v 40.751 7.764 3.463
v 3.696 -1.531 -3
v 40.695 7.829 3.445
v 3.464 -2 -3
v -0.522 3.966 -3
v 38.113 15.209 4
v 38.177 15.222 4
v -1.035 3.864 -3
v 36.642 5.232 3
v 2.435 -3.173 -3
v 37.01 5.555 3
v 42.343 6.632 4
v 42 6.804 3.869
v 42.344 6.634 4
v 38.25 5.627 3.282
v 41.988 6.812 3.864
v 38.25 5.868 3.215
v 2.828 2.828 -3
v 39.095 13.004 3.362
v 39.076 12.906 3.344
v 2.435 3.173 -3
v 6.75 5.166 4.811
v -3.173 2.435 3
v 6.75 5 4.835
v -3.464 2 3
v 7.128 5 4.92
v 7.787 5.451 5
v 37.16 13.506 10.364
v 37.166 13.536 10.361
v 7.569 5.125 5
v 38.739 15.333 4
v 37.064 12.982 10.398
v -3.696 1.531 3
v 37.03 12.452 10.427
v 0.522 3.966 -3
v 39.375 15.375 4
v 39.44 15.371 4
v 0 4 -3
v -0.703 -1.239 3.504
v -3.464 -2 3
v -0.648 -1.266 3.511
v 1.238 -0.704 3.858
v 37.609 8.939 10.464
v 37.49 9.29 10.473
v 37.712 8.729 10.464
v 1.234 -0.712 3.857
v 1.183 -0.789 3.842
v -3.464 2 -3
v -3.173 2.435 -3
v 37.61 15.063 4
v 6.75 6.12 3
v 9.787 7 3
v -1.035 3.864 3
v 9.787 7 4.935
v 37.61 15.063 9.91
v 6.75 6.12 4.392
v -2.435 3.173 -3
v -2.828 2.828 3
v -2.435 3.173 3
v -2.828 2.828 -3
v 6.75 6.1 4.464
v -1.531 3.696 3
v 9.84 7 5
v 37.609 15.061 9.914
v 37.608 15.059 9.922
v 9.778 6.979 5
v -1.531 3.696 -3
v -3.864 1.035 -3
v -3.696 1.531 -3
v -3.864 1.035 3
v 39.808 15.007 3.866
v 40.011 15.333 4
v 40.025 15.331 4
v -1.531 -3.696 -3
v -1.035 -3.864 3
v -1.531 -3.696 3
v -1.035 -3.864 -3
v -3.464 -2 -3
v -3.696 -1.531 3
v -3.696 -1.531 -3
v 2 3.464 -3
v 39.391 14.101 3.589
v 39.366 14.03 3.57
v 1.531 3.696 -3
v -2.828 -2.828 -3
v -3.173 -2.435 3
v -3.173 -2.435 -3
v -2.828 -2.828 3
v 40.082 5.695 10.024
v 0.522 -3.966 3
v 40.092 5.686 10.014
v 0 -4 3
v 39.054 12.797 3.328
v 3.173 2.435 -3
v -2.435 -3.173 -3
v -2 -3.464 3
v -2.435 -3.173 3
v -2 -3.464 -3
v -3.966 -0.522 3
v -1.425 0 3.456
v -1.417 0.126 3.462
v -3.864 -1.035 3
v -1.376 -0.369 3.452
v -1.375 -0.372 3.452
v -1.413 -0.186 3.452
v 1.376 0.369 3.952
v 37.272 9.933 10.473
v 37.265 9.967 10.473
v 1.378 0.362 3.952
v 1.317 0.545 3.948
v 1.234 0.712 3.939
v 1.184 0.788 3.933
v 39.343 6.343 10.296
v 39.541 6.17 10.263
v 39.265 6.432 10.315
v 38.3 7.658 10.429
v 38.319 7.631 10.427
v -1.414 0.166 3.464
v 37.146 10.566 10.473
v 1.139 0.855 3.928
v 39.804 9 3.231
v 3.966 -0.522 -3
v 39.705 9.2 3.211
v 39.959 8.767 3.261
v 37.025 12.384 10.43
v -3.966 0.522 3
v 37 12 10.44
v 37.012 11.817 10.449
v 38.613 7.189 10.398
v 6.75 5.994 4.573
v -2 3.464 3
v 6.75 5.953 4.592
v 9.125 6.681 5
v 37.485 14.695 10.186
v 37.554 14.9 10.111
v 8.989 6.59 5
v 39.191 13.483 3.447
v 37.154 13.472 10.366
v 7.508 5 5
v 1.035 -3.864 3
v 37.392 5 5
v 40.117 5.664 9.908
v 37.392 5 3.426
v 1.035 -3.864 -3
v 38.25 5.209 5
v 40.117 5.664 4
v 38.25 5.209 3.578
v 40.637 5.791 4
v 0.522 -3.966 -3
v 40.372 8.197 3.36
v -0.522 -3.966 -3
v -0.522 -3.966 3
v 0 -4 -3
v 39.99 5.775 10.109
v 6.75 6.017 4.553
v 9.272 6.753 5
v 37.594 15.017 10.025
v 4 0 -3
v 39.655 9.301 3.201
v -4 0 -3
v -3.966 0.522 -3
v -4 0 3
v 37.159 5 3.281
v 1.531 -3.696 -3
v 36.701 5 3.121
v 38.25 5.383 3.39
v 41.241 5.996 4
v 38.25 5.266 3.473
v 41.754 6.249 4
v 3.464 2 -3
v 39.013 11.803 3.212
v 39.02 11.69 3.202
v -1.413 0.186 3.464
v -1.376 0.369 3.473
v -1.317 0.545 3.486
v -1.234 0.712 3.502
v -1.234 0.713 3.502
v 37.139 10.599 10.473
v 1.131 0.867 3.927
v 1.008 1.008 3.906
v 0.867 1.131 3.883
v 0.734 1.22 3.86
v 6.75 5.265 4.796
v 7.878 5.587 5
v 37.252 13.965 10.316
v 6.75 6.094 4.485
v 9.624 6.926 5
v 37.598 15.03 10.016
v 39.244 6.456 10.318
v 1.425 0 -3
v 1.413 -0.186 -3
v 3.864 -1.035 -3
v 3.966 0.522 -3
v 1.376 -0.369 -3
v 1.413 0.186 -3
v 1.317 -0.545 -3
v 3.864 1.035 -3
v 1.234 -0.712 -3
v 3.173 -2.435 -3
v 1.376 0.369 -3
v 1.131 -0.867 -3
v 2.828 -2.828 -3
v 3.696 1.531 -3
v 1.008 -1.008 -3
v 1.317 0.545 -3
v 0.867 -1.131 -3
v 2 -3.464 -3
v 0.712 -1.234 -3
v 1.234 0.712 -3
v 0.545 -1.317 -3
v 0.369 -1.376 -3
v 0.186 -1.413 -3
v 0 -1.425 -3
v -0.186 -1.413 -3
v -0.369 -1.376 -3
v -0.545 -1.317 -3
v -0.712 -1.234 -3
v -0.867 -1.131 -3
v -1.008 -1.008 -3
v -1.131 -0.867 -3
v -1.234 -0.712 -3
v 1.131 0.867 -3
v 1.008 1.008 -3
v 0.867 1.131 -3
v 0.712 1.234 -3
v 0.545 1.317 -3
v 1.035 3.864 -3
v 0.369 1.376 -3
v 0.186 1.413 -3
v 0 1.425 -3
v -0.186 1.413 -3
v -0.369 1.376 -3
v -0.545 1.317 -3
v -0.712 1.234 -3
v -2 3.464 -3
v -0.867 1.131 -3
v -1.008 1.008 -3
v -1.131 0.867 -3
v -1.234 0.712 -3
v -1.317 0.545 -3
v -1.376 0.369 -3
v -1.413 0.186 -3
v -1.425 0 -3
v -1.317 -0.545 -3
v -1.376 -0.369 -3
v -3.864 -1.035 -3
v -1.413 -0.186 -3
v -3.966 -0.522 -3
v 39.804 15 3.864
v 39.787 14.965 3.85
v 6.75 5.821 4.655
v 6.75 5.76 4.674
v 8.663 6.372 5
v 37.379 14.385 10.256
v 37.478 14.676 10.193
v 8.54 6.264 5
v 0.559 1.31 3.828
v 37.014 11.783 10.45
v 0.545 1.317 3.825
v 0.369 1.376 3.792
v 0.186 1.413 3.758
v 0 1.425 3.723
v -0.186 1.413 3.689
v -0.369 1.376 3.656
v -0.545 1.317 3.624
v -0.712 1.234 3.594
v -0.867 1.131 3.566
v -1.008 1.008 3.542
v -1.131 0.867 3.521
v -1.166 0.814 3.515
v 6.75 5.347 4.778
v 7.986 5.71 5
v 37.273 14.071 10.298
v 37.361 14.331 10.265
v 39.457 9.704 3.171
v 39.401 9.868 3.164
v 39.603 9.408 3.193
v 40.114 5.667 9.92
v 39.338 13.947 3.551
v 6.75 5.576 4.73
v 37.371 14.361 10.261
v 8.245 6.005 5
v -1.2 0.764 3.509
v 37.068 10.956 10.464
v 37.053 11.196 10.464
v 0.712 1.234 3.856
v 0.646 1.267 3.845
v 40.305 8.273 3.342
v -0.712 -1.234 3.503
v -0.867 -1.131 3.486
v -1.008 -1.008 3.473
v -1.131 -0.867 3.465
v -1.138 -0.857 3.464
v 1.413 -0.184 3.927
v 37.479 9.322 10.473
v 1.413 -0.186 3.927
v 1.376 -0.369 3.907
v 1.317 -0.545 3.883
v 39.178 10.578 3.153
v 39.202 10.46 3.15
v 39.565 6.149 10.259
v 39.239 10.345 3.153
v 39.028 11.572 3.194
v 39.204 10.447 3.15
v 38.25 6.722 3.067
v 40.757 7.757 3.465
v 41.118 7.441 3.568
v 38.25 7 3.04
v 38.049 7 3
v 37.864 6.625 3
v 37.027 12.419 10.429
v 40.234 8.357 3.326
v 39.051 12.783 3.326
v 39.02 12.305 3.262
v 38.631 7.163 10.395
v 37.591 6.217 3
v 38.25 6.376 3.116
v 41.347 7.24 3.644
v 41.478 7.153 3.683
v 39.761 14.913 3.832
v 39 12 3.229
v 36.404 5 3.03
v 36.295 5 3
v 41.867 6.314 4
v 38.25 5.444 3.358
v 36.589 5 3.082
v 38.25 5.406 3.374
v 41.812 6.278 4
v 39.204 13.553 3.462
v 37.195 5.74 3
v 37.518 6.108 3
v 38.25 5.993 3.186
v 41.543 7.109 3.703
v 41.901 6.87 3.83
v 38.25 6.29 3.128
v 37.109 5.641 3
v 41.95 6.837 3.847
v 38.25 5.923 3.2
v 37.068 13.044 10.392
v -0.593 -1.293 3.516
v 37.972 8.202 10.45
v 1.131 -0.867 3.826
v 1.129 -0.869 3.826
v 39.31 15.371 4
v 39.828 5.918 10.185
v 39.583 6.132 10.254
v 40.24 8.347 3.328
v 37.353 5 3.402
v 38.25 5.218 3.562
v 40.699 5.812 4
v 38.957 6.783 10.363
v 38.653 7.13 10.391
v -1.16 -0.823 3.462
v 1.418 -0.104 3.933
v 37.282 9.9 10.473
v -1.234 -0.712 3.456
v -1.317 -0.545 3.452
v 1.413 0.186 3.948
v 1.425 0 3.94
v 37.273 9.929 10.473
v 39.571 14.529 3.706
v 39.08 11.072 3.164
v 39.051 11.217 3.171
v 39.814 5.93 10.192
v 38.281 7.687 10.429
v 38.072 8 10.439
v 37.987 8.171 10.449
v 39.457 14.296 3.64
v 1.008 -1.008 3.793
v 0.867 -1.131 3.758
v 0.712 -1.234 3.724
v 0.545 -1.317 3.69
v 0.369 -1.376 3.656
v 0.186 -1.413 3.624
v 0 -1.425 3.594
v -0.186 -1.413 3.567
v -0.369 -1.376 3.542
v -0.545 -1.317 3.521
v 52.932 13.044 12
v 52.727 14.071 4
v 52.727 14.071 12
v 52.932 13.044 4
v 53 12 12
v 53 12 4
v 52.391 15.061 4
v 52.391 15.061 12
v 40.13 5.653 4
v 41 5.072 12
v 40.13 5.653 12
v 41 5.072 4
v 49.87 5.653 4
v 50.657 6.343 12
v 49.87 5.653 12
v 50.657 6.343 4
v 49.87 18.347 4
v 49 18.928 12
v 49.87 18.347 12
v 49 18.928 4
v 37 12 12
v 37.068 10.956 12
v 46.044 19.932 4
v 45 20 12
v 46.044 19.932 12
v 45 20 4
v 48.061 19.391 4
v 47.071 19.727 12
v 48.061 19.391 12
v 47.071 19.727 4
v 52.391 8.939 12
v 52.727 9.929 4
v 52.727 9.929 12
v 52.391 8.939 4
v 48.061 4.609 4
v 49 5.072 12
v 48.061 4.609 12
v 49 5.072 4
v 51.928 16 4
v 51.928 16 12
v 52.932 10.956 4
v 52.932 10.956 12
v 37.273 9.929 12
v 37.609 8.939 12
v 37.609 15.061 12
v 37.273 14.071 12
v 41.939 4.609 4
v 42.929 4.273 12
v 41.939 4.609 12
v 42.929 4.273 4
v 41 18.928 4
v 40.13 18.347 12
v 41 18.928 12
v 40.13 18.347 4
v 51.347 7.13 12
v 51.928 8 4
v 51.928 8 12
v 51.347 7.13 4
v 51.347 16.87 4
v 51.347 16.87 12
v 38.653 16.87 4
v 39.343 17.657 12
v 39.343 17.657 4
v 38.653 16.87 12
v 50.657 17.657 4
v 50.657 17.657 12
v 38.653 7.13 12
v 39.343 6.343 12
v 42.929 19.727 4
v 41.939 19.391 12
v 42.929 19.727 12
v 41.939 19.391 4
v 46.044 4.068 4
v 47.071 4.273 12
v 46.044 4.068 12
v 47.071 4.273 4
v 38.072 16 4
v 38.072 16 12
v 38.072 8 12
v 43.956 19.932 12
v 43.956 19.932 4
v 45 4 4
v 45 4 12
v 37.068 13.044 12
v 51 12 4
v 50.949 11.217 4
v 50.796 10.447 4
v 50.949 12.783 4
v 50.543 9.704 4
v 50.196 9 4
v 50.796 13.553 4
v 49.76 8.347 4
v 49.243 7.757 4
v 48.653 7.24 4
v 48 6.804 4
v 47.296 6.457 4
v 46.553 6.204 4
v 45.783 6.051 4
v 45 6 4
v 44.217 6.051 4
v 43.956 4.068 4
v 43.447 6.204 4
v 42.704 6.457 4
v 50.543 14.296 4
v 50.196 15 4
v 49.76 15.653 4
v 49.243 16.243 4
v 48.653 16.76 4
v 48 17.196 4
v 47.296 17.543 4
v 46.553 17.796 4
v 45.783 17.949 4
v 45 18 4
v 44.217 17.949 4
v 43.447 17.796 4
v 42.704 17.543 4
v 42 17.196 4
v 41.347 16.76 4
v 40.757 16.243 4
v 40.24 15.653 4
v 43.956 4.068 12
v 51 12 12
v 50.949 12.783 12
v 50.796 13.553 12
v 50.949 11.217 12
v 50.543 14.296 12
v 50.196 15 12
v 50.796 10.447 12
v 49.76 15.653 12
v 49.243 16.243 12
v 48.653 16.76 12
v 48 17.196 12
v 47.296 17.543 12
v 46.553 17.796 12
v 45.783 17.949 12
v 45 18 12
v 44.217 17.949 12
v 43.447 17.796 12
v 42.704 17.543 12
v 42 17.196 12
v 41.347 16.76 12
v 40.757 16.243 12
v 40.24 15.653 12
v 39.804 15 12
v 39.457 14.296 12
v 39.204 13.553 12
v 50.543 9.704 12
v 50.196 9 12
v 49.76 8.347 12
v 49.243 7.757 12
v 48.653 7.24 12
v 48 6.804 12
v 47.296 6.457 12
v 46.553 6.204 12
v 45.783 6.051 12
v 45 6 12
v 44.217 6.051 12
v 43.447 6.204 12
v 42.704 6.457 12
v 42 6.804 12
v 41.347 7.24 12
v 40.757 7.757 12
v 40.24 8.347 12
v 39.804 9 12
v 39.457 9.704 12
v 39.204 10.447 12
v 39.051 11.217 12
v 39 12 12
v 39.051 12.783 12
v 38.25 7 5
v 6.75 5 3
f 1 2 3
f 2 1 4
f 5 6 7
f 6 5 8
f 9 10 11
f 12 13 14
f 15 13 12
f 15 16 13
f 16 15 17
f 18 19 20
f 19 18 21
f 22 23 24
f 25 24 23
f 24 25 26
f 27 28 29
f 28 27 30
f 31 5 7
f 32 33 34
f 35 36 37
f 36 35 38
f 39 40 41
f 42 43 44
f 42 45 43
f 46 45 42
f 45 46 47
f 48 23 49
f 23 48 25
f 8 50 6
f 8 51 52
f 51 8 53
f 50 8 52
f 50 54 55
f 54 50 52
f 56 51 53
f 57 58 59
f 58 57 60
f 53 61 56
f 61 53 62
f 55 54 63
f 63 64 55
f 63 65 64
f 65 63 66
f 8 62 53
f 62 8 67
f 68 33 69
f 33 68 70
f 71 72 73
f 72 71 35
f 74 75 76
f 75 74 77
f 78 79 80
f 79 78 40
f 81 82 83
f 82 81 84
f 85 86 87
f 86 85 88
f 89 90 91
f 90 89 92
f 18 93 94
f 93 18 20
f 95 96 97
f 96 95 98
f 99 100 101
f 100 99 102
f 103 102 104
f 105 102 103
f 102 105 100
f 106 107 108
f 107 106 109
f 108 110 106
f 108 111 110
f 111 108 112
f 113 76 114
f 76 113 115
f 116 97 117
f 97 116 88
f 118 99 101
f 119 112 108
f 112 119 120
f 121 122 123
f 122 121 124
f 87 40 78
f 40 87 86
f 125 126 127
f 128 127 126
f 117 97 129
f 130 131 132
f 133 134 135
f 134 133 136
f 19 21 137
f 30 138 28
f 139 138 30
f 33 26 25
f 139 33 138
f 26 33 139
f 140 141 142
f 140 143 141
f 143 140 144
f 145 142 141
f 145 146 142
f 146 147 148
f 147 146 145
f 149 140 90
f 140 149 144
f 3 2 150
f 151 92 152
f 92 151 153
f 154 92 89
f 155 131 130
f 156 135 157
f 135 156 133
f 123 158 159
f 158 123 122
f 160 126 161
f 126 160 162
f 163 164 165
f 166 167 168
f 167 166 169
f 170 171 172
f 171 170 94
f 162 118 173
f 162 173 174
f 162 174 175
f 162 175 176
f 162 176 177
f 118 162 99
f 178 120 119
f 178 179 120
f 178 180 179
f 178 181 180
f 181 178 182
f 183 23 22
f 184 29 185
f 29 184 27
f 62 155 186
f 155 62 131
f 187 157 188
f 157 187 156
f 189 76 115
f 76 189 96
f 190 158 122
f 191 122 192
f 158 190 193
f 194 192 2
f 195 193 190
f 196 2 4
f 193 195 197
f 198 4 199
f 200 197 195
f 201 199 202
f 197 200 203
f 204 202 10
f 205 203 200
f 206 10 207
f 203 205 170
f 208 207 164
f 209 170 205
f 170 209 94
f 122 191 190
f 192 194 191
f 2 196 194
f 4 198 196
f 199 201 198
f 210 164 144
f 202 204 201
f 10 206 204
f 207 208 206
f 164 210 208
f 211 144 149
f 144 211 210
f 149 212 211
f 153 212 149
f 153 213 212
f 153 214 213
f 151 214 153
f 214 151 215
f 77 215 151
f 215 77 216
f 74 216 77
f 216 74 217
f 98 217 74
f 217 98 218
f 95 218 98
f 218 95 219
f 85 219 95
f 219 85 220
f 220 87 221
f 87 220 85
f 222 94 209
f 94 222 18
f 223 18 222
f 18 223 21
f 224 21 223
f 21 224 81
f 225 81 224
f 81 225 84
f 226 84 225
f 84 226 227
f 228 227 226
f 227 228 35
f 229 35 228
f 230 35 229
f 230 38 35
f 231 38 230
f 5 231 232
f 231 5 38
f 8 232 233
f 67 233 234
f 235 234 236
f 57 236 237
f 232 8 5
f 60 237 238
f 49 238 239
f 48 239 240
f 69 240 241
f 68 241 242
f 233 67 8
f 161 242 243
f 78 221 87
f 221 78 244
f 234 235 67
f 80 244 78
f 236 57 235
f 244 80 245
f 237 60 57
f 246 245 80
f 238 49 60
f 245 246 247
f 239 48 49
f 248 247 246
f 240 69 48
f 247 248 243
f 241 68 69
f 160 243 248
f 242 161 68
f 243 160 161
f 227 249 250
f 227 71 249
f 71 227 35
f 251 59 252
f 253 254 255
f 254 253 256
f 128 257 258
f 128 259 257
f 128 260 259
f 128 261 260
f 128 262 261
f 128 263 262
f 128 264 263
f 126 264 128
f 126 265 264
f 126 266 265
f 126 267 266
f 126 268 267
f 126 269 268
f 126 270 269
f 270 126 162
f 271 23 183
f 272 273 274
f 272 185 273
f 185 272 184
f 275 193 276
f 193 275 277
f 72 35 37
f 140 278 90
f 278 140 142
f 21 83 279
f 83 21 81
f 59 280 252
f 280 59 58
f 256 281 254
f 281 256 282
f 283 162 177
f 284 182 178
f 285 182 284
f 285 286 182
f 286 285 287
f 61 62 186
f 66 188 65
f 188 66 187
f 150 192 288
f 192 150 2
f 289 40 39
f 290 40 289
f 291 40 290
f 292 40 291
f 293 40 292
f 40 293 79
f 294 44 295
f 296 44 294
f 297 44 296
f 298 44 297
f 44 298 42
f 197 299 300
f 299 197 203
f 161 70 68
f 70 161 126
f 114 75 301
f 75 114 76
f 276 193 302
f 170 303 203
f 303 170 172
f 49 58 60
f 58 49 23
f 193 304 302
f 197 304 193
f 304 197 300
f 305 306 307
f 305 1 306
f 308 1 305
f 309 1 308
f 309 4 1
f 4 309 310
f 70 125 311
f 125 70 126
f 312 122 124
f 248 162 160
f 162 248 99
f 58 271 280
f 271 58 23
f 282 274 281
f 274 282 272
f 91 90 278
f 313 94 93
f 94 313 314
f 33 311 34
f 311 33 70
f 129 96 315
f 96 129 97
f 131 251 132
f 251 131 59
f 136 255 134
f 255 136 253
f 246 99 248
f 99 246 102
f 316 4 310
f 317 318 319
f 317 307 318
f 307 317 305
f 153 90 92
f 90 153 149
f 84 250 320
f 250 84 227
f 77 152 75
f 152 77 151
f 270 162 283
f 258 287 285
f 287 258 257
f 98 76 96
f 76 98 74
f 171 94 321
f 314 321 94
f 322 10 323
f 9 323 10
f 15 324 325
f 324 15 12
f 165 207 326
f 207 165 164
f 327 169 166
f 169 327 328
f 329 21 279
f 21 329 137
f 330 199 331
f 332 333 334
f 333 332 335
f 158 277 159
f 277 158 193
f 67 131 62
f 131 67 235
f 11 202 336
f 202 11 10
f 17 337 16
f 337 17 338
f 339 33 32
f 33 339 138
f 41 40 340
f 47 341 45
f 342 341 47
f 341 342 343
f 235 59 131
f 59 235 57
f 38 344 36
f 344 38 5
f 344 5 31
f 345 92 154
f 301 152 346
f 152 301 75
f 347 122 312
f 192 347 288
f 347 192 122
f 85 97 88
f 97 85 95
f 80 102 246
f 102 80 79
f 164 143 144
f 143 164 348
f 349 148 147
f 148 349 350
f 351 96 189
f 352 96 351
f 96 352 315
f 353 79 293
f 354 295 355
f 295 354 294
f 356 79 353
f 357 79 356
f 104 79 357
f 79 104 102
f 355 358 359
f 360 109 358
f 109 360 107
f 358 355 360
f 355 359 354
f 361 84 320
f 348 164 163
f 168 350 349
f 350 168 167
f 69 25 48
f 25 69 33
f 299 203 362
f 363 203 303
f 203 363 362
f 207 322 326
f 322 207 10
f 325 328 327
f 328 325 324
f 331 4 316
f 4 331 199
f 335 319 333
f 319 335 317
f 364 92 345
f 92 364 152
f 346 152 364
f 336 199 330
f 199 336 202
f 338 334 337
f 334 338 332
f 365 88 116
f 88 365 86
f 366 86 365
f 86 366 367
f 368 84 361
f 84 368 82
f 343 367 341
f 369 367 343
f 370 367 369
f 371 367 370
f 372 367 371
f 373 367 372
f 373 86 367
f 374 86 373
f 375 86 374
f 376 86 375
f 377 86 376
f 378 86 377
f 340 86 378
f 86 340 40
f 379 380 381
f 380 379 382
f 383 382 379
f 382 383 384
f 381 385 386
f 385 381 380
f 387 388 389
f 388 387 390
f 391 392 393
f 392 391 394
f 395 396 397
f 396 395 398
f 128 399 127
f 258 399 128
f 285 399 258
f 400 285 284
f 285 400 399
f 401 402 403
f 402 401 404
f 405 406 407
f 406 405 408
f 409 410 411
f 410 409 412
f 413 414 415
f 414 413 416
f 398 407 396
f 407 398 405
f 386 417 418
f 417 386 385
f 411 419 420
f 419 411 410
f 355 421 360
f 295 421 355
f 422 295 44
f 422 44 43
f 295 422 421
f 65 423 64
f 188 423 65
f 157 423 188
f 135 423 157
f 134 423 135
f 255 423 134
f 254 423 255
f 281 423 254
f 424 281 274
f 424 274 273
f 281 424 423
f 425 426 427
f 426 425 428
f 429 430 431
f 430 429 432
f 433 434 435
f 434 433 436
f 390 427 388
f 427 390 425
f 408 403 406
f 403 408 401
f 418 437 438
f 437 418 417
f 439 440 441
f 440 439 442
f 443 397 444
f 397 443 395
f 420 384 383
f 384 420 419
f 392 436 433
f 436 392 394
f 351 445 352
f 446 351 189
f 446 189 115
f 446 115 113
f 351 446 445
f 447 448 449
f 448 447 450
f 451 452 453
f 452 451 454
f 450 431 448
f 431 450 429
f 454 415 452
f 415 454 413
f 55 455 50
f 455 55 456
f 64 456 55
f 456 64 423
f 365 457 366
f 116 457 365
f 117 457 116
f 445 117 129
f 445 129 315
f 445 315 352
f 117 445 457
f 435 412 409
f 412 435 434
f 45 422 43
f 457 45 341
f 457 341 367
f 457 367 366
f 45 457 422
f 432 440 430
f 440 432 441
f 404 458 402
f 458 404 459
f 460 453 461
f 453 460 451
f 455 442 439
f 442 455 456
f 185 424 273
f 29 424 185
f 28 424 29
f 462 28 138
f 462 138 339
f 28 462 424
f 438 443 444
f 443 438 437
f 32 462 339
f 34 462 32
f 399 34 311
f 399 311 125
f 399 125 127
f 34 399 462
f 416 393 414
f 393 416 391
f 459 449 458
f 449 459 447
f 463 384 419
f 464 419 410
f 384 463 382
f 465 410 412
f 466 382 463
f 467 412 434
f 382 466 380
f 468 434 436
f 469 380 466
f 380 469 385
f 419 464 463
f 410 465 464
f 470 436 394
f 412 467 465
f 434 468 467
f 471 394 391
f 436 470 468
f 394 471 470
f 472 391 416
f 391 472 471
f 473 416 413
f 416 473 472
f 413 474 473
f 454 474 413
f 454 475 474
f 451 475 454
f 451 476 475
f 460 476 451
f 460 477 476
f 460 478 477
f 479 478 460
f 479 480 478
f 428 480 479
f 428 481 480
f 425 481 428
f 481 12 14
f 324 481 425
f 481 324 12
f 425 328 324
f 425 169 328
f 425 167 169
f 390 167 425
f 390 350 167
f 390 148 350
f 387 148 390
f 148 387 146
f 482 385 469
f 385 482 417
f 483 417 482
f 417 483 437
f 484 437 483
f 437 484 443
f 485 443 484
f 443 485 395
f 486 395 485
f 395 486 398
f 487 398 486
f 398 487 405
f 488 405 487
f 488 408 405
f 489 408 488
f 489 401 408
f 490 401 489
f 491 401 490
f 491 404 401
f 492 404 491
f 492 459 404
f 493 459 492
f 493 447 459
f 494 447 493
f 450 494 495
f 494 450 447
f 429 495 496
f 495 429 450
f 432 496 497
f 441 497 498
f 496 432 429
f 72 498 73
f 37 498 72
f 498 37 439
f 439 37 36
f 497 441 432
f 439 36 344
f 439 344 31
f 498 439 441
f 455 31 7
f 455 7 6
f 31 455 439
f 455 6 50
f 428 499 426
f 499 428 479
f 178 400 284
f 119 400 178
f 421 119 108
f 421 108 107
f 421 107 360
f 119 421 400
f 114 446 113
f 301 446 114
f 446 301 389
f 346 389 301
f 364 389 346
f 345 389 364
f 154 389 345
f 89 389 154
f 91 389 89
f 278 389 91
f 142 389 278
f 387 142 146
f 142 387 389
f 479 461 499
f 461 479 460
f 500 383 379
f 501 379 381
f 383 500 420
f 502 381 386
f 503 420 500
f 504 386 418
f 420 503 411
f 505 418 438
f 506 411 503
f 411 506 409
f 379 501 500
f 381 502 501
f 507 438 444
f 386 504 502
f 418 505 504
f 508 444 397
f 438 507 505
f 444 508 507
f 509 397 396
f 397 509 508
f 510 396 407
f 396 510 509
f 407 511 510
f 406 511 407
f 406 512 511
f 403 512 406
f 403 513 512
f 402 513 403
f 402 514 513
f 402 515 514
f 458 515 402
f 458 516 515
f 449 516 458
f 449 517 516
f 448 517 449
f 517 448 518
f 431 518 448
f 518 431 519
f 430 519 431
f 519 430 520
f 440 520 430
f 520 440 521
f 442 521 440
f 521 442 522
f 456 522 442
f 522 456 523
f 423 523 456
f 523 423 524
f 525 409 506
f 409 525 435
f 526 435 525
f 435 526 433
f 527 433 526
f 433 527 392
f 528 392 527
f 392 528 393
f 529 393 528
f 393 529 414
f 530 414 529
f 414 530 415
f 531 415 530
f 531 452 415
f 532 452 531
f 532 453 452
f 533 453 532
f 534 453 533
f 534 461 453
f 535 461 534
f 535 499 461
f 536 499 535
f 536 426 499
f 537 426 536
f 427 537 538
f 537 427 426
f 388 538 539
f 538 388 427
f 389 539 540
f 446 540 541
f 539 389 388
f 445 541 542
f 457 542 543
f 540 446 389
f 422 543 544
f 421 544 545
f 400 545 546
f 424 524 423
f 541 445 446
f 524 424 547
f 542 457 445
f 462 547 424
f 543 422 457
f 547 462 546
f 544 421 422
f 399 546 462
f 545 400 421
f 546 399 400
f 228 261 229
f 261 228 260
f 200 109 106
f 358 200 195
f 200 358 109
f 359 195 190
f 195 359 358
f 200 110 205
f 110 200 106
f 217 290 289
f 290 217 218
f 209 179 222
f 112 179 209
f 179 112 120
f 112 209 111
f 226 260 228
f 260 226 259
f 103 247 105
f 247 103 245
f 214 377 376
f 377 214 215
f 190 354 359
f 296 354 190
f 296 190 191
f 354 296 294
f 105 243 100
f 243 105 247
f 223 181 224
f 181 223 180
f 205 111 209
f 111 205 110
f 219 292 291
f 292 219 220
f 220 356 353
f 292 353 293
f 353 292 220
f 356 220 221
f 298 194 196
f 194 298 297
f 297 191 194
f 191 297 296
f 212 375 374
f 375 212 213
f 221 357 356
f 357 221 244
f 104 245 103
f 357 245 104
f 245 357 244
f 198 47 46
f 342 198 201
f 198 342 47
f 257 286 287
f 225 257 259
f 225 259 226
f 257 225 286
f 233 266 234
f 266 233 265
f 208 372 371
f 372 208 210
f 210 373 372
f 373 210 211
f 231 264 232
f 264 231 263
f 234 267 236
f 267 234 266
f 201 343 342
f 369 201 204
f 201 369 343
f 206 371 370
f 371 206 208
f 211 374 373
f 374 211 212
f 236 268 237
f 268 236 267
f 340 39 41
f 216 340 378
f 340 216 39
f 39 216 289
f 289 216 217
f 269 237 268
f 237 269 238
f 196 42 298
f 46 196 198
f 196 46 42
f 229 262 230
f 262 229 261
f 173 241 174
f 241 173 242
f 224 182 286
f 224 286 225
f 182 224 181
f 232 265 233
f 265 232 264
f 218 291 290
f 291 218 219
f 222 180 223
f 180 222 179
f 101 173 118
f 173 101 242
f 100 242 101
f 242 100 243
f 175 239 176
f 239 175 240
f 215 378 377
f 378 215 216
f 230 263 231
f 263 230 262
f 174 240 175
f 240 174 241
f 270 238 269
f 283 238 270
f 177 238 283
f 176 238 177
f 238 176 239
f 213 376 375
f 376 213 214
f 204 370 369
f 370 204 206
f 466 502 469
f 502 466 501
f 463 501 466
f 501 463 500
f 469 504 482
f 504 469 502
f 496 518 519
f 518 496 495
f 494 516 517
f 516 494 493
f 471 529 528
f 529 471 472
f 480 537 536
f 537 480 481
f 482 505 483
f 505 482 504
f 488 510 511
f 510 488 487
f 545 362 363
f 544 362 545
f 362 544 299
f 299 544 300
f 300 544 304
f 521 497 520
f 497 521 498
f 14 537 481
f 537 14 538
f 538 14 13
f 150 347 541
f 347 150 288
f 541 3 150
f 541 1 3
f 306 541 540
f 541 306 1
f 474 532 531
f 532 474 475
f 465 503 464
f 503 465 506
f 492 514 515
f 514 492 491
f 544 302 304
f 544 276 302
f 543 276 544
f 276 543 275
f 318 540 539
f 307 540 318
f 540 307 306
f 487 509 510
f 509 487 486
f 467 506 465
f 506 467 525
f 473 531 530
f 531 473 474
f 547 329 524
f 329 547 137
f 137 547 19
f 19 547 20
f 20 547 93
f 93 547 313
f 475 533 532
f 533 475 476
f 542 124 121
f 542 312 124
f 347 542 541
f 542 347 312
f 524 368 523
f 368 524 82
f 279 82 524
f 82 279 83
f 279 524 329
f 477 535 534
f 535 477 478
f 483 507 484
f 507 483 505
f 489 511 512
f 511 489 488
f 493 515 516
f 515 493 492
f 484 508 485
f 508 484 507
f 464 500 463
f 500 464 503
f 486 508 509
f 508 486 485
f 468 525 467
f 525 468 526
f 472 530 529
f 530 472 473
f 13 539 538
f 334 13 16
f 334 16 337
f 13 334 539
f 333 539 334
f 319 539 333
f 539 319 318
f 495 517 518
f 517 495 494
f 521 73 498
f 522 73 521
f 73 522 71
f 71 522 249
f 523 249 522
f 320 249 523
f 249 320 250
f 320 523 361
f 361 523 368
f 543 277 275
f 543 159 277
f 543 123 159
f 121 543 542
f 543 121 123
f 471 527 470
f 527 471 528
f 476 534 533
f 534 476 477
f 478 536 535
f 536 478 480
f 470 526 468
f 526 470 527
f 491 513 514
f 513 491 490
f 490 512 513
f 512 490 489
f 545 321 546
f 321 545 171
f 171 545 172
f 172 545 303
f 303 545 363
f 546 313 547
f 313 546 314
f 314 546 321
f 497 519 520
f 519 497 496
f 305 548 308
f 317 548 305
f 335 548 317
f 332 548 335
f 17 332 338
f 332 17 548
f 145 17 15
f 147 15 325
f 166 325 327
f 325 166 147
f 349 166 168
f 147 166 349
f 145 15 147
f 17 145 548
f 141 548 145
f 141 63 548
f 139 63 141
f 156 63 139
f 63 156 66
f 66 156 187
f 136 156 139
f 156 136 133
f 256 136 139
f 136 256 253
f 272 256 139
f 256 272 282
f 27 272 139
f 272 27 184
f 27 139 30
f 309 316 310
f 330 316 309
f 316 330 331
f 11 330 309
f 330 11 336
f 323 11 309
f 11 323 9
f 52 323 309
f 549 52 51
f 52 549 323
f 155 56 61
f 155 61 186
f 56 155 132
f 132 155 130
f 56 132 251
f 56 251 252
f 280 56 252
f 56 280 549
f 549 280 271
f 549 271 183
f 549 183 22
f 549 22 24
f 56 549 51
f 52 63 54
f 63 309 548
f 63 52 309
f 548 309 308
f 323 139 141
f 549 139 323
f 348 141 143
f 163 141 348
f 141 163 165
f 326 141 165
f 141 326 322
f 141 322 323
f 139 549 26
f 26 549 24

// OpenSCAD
// file: ../params.scad
// Vexamicus T0/T1 parametric dimensions (mm)
// Inspired by published Salto-class proportions — original geometry, not a CAD clone.

/* [Scale] */
// Overall linear scale vs nominal T1 (1.0 ≈ 240 mm body height class)
SCALE = 1.0;

/* [Body] */
BODY_W = 42 * SCALE;      // Y width
BODY_H = 38 * SCALE;      // Z height of core block
BODY_L = 55 * SCALE;      // X length
WALL = 2.4 * SCALE;
BATTERY_L = 48 * SCALE;
BATTERY_W = 18 * SCALE;
BATTERY_H = 14 * SCALE;

/* [Leg 4-bar] */
HIP_Z = -8 * SCALE;                 // hip joint below body center
FEMUR_L = 55 * SCALE;               // hip → knee
SHIN_L = 70 * SCALE;                // knee → foot
COUPLER_L = 48 * SCALE;             // parallel coupler
CRANK_L = 18 * SCALE;               // SEA output crank
LEG_THICK = 5 * SCALE;
LEG_WIDTH = 8 * SCALE;
BEARING_ID = 3.2;                   // M3 clearance
BEARING_OD = 10.0;                  // 623-ish pocket (simplified)

/* [Foot] */
TOE_R = 12 * SCALE;
ANKLE_PAD_H = 6 * SCALE;

/* [SEA hub] */
SEA_HUB_R = 16 * SCALE;
SEA_HUB_H = 12 * SCALE;
MOTOR_BORE = 5.2;                   // typical BLDC shaft
SPRING_SLOT_W = 4.5 * SCALE;

/* [Tail / reaction wheel] */
TAIL_BOOM_L = 35 * SCALE;
TAIL_WHEEL_R = 28 * SCALE;
TAIL_WHEEL_H = 8 * SCALE;
TAIL_SHAFT = 3.2;

/* [Thruster booms T2] */
THRUST_BOOM_L = 45 * SCALE;
THRUST_ARM_ROLL = 40 * SCALE;       // ~ half of Salto 80mm moment arm at SCALE~1
THRUST_MOTOR_R = 6 * SCALE;

/* [Clearance / print] */
CLEAR = 0.25;
$fn = 48;

function mm(x) = x;
// file: ../vitamins.scad
// Shared primitives
include <params.scad>

module round_rect(size, r=1.5, center=false) {
    // size = [x,y,z]
    x=size[0]; y=size[1]; z=size[2];
    translate(center ? [-x/2,-y/2,-z/2] : [0,0,0])
    minkowski() {
        cube([max(0.01,x-2*r), max(0.01,y-2*r), max(0.01,z)], center=false);
        cylinder(r=r, h=0.01, center=false);
    }
}

module bearing_pocket(h=LEG_THICK+0.2) {
    cylinder(d=BEARING_OD + CLEAR, h=h, center=true);
}

module bolt_hole(d=BEARING_ID, h=40) {
    cylinder(d=d + CLEAR, h=h, center=true);
}

module carbon_tube(L=50, od=4, id=3) {
    difference() {
        cylinder(d=od, h=L, center=true);
        cylinder(d=id, h=L+1, center=true);
    }
}

module motor_standoff_pattern(spacing=16, h=6, d=2.2) {
    for (a=[0:90:270])
        rotate([0,0,a]) translate([spacing/2,0,0])
            cylinder(d=d, h=h, center=true);
}
// main file
// T2 thruster boom (pair mirrored in assembly)
include <../vitamins.scad>

module thruster_boom(side=1) {
    difference() {
        union() {
            // spar
            hull() {
                cylinder(d=8*SCALE, h=6*SCALE, center=true);
                translate([THRUST_BOOM_L, side*12*SCALE, 8*SCALE])
                    cylinder(d=10*SCALE, h=6*SCALE, center=true);
            }
            translate([THRUST_BOOM_L, side*12*SCALE, 8*SCALE])
                cylinder(r=THRUST_MOTOR_R+2, h=8*SCALE, center=true);
        }
        // body bolt
        bolt_hole(d=2.6);
        // motor bore
        translate([THRUST_BOOM_L, side*12*SCALE, 8*SCALE])
            cylinder(r=THRUST_MOTOR_R, h=10*SCALE, center=true);
        // wire channel
        translate([THRUST_BOOM_L/2, side*6, 4])
            cube([THRUST_BOOM_L*0.7, 2, 2], center=true);
    }
}

thruster_boom(1);
